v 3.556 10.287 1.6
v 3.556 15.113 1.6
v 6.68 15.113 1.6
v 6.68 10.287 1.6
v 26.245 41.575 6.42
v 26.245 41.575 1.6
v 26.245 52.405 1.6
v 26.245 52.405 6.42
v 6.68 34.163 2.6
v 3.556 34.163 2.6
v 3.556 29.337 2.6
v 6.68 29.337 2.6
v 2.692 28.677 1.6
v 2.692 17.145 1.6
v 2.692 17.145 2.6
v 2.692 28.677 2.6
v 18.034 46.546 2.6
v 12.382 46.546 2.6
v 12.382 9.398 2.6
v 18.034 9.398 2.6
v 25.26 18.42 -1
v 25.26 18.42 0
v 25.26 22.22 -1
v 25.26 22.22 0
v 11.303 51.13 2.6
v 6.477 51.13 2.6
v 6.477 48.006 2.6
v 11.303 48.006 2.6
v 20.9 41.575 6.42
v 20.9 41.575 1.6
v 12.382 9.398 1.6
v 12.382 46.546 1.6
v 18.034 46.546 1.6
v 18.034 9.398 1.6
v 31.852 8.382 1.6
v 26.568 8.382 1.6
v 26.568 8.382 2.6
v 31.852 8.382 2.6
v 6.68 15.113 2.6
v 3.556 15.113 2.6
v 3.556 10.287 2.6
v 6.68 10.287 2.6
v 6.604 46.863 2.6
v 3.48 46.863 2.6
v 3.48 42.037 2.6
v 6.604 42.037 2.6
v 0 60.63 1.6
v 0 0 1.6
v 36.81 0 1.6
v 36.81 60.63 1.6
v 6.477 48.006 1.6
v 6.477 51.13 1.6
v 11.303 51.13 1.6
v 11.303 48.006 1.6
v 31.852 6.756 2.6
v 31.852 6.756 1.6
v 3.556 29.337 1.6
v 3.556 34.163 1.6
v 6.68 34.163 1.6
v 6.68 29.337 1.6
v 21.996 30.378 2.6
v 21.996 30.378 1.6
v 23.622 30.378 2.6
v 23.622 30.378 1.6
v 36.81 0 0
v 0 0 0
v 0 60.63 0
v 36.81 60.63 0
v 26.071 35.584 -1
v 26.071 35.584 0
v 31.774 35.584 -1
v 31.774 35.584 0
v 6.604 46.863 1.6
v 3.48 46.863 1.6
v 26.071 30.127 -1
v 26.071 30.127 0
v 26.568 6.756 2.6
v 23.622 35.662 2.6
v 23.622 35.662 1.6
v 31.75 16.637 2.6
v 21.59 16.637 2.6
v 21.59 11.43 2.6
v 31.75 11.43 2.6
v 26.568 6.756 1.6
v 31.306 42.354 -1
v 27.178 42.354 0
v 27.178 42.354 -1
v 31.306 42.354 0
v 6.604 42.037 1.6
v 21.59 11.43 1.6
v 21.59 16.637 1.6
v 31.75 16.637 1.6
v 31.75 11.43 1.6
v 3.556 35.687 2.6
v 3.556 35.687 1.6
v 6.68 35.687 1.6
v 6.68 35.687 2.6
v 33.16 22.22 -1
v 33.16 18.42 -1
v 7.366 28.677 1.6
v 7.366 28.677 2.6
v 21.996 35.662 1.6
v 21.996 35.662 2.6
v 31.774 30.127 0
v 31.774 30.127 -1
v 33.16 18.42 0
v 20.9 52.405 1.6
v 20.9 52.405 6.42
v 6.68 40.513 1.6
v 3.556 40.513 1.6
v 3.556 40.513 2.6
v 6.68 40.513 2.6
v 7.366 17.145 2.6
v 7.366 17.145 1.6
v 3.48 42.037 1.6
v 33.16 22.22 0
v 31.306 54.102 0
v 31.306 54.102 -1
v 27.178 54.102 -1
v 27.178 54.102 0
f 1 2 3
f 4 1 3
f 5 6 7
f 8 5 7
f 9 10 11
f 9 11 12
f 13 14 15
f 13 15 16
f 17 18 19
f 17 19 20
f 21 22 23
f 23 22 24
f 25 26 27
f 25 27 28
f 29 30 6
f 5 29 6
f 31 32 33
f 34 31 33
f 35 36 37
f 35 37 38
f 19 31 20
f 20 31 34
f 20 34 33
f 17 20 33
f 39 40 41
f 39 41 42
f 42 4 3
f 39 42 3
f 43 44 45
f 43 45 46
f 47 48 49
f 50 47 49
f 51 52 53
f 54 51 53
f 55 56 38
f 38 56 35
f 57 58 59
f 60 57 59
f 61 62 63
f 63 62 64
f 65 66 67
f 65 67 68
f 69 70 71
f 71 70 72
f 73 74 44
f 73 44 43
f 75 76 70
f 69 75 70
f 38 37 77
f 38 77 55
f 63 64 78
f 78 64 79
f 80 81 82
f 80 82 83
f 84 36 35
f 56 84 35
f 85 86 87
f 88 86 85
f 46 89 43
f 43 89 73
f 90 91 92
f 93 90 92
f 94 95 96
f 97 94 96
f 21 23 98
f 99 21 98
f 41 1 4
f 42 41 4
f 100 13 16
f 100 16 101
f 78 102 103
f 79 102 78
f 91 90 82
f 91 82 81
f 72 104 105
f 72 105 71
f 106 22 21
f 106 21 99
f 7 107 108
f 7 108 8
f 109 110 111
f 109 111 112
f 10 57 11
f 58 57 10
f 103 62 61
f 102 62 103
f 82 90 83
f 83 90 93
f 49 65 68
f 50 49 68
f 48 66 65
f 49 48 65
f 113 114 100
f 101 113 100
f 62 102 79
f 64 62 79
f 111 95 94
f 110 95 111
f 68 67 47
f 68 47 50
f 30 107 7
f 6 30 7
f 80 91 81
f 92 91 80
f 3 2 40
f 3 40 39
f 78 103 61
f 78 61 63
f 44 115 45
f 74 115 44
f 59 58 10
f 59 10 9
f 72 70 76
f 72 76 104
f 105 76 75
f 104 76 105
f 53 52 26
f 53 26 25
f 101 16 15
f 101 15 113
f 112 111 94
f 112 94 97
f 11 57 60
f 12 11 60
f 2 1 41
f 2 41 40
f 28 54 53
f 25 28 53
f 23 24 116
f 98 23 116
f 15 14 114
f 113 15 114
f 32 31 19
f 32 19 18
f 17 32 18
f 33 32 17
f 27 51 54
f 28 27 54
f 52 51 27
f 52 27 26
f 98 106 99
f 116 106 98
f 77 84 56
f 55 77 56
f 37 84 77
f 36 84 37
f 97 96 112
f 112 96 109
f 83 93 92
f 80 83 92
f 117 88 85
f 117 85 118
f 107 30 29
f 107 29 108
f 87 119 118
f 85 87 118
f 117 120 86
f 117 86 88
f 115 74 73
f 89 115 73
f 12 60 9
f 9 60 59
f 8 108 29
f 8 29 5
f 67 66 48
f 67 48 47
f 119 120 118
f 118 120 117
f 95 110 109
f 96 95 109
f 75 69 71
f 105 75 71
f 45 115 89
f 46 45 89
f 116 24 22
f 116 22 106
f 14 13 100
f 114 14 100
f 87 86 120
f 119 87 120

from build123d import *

# Parameters (mm, degrees)
SKETCH1_W                              = 36.81
SKETCH1_H                              = 60.63
BOARD_DEPTH                            = 1.6
SKETCH2_W                              = 4.826
SKETCH2_H                              = 3.1242
C025_030X050_1_DEPTH                   = 1
SKETCH3_W                              = 3.1242
SKETCH3_H                              = 4.826
C025_030X050_2_DEPTH                   = 1
SKETCH4_W                              = 3.1242
SKETCH4_H                              = 4.826
C025_030X050_3_DEPTH                   = 1
SKETCH5_W                              = 3.1242
SKETCH5_H                              = 4.826
C025_030X050_4_DEPTH                   = 1
SKETCH6_W                              = 3.1242
SKETCH6_H                              = 4.826
C025_030X050_5_DEPTH                   = 1
SKETCH7_W                              = 10.16
SKETCH7_H                              = 5.207
AB9V_1_DEPTH                           = 1
SKETCH8_W                              = 5.6515
SKETCH8_H                              = 37.1475
DIL28_1_DEPTH                          = 1
SKETCH9_W                              = 5.7024
SKETCH9_H                              = 5.4564
RGBLED5050_1_DEPTH                     = 1
SKETCH10_W                             = 5.345
SKETCH10_H                             = 10.83
TO254P482X997X1968_3P_4_820000_1_DEPTH = 4.82
SKETCH11_W                             = 1.6256
SKETCH11_H                             = 5.2832
AXIAL_0_3_1_DEPTH                      = 1
SKETCH12_W                             = 5.2832
SKETCH12_H                             = 1.6256
AXIAL_0_3_2_DEPTH                      = 1
SKETCH13_W                             = 4.1275
SKETCH13_H                             = 11.7475
EG1218_1_DEPTH                         = 1
SKETCH14_W                             = 7.9
SKETCH14_H                             = 3.8
TACT_PANA_EVQ_1_DEPTH                  = 1
SKETCH15_W                             = 4.6736
SKETCH15_H                             = 11.5316
HC49US_1_DEPTH                         = 1


with BuildPart() as part:
    # Sketch1 → BOARD (new body)
    with BuildSketch(Plane.XY):
        with Locations((18.405, 30.315)):
            Rectangle(SKETCH1_W, SKETCH1_H)
    extrude(amount=BOARD_DEPTH)


with BuildPart() as body_2:
    # Sketch2 → C025-030X050-1 (new body)
    with BuildSketch(Plane.XY.offset(1.6)):
        with Locations((8.89, 49.5681)):
            Rectangle(SKETCH2_W, SKETCH2_H)
    extrude(amount=C025_030X050_1_DEPTH)


with BuildPart() as body_3:
    # Sketch3 → C025-030X050-2 (new body)
    with BuildSketch(Plane.XY.offset(1.6)):
        with Locations((5.0419, 44.45)):
            Rectangle(SKETCH3_W, SKETCH3_H)
    extrude(amount=C025_030X050_2_DEPTH)


with BuildPart() as body_4:
    # Sketch4 → C025-030X050-3 (new body)
    with BuildSketch(Plane.XY.offset(1.6)):
        with Locations((5.1181, 38.1)):
            Rectangle(SKETCH4_W, SKETCH4_H)
    extrude(amount=C025_030X050_3_DEPTH)


with BuildPart() as body_5:
    # Sketch5 → C025-030X050-4 (new body)
    with BuildSketch(Plane.XY.offset(1.6)):
        with Locations((5.1181, 31.75)):
            Rectangle(SKETCH5_W, SKETCH5_H)
    extrude(amount=C025_030X050_4_DEPTH)


with BuildPart() as body_6:
    # Sketch6 → C025-030X050-5 (new body)
    with BuildSketch(Plane.XY.offset(1.6)):
        with Locations((5.1181, 12.7)):
            Rectangle(SKETCH6_W, SKETCH6_H)
    extrude(amount=C025_030X050_5_DEPTH)


with BuildPart() as body_7:
    # Sketch7 → AB9V-1 (new body)
    with BuildSketch(Plane.XY.offset(1.6)):
        with Locations((26.67, 14.0335)):
            Rectangle(SKETCH7_W, SKETCH7_H)
    extrude(amount=AB9V_1_DEPTH)


with BuildPart() as body_8:
    # Sketch8 → DIL28-1 (new body)
    with BuildSketch(Plane.XY.offset(1.6)):
        with Locations((15.20825, 27.97175)):
            Rectangle(SKETCH8_W, SKETCH8_H)
    extrude(amount=DIL28_1_DEPTH)


with BuildPart() as body_9:
    # Sketch9 → RGBLED5050-1 (new body)
    with BuildSketch(Plane.XY):
        with Locations((28.9223, 32.8553)):
            Rectangle(SKETCH9_W, SKETCH9_H)
    extrude(amount=-RGBLED5050_1_DEPTH)


with BuildPart() as body_10:
    # Sketch10 → TO254P482X997X1968-3P_4.820000-1 (new body)
    with BuildSketch(Plane.XY.offset(1.6)):
        with Locations((23.5725, 46.99)):
            Rectangle(SKETCH10_W, SKETCH10_H)
    extrude(amount=TO254P482X997X1968_3P_4_820000_1_DEPTH)


with BuildPart() as body_11:
    # Sketch11 → AXIAL-0_3-1 (new body)
    with BuildSketch(Plane.XY.offset(1.6)):
        with Locations((22.8092, 33.02)):
            Rectangle(SKETCH11_W, SKETCH11_H)
    extrude(amount=AXIAL_0_3_1_DEPTH)


with BuildPart() as body_12:
    # Sketch12 → AXIAL-0_3-2 (new body)
    with BuildSketch(Plane.XY.offset(1.6)):
        with Locations((29.21, 7.5692)):
            Rectangle(SKETCH12_W, SKETCH12_H)
    extrude(amount=AXIAL_0_3_2_DEPTH)


with BuildPart() as body_13:
    # Sketch13 → EG1218-1 (new body)
    with BuildSketch(Plane.XY):
        with Locations((29.24175, 48.22825)):
            Rectangle(SKETCH13_W, SKETCH13_H)
    extrude(amount=-EG1218_1_DEPTH)


with BuildPart() as body_14:
    # Sketch14 → TACT_PANA-EVQ-1 (new body)
    with BuildSketch(Plane.XY):
        with Locations((29.21, 20.32)):
            Rectangle(SKETCH14_W, SKETCH14_H)
    extrude(amount=-TACT_PANA_EVQ_1_DEPTH)


with BuildPart() as body_15:
    # Sketch15 → HC49US-1 (new body)
    with BuildSketch(Plane.XY.offset(1.6)):
        with Locations((5.0292, 22.9108)):
            Rectangle(SKETCH15_W, SKETCH15_H)
    extrude(amount=HC49US_1_DEPTH)


solid = Compound([part.part, body_2.part, body_3.part, body_4.part, body_5.part, body_6.part, body_7.part, body_8.part, body_9.part, body_10.part, body_11.part, body_12.part, body_13.part, body_14.part, body_15.part])
